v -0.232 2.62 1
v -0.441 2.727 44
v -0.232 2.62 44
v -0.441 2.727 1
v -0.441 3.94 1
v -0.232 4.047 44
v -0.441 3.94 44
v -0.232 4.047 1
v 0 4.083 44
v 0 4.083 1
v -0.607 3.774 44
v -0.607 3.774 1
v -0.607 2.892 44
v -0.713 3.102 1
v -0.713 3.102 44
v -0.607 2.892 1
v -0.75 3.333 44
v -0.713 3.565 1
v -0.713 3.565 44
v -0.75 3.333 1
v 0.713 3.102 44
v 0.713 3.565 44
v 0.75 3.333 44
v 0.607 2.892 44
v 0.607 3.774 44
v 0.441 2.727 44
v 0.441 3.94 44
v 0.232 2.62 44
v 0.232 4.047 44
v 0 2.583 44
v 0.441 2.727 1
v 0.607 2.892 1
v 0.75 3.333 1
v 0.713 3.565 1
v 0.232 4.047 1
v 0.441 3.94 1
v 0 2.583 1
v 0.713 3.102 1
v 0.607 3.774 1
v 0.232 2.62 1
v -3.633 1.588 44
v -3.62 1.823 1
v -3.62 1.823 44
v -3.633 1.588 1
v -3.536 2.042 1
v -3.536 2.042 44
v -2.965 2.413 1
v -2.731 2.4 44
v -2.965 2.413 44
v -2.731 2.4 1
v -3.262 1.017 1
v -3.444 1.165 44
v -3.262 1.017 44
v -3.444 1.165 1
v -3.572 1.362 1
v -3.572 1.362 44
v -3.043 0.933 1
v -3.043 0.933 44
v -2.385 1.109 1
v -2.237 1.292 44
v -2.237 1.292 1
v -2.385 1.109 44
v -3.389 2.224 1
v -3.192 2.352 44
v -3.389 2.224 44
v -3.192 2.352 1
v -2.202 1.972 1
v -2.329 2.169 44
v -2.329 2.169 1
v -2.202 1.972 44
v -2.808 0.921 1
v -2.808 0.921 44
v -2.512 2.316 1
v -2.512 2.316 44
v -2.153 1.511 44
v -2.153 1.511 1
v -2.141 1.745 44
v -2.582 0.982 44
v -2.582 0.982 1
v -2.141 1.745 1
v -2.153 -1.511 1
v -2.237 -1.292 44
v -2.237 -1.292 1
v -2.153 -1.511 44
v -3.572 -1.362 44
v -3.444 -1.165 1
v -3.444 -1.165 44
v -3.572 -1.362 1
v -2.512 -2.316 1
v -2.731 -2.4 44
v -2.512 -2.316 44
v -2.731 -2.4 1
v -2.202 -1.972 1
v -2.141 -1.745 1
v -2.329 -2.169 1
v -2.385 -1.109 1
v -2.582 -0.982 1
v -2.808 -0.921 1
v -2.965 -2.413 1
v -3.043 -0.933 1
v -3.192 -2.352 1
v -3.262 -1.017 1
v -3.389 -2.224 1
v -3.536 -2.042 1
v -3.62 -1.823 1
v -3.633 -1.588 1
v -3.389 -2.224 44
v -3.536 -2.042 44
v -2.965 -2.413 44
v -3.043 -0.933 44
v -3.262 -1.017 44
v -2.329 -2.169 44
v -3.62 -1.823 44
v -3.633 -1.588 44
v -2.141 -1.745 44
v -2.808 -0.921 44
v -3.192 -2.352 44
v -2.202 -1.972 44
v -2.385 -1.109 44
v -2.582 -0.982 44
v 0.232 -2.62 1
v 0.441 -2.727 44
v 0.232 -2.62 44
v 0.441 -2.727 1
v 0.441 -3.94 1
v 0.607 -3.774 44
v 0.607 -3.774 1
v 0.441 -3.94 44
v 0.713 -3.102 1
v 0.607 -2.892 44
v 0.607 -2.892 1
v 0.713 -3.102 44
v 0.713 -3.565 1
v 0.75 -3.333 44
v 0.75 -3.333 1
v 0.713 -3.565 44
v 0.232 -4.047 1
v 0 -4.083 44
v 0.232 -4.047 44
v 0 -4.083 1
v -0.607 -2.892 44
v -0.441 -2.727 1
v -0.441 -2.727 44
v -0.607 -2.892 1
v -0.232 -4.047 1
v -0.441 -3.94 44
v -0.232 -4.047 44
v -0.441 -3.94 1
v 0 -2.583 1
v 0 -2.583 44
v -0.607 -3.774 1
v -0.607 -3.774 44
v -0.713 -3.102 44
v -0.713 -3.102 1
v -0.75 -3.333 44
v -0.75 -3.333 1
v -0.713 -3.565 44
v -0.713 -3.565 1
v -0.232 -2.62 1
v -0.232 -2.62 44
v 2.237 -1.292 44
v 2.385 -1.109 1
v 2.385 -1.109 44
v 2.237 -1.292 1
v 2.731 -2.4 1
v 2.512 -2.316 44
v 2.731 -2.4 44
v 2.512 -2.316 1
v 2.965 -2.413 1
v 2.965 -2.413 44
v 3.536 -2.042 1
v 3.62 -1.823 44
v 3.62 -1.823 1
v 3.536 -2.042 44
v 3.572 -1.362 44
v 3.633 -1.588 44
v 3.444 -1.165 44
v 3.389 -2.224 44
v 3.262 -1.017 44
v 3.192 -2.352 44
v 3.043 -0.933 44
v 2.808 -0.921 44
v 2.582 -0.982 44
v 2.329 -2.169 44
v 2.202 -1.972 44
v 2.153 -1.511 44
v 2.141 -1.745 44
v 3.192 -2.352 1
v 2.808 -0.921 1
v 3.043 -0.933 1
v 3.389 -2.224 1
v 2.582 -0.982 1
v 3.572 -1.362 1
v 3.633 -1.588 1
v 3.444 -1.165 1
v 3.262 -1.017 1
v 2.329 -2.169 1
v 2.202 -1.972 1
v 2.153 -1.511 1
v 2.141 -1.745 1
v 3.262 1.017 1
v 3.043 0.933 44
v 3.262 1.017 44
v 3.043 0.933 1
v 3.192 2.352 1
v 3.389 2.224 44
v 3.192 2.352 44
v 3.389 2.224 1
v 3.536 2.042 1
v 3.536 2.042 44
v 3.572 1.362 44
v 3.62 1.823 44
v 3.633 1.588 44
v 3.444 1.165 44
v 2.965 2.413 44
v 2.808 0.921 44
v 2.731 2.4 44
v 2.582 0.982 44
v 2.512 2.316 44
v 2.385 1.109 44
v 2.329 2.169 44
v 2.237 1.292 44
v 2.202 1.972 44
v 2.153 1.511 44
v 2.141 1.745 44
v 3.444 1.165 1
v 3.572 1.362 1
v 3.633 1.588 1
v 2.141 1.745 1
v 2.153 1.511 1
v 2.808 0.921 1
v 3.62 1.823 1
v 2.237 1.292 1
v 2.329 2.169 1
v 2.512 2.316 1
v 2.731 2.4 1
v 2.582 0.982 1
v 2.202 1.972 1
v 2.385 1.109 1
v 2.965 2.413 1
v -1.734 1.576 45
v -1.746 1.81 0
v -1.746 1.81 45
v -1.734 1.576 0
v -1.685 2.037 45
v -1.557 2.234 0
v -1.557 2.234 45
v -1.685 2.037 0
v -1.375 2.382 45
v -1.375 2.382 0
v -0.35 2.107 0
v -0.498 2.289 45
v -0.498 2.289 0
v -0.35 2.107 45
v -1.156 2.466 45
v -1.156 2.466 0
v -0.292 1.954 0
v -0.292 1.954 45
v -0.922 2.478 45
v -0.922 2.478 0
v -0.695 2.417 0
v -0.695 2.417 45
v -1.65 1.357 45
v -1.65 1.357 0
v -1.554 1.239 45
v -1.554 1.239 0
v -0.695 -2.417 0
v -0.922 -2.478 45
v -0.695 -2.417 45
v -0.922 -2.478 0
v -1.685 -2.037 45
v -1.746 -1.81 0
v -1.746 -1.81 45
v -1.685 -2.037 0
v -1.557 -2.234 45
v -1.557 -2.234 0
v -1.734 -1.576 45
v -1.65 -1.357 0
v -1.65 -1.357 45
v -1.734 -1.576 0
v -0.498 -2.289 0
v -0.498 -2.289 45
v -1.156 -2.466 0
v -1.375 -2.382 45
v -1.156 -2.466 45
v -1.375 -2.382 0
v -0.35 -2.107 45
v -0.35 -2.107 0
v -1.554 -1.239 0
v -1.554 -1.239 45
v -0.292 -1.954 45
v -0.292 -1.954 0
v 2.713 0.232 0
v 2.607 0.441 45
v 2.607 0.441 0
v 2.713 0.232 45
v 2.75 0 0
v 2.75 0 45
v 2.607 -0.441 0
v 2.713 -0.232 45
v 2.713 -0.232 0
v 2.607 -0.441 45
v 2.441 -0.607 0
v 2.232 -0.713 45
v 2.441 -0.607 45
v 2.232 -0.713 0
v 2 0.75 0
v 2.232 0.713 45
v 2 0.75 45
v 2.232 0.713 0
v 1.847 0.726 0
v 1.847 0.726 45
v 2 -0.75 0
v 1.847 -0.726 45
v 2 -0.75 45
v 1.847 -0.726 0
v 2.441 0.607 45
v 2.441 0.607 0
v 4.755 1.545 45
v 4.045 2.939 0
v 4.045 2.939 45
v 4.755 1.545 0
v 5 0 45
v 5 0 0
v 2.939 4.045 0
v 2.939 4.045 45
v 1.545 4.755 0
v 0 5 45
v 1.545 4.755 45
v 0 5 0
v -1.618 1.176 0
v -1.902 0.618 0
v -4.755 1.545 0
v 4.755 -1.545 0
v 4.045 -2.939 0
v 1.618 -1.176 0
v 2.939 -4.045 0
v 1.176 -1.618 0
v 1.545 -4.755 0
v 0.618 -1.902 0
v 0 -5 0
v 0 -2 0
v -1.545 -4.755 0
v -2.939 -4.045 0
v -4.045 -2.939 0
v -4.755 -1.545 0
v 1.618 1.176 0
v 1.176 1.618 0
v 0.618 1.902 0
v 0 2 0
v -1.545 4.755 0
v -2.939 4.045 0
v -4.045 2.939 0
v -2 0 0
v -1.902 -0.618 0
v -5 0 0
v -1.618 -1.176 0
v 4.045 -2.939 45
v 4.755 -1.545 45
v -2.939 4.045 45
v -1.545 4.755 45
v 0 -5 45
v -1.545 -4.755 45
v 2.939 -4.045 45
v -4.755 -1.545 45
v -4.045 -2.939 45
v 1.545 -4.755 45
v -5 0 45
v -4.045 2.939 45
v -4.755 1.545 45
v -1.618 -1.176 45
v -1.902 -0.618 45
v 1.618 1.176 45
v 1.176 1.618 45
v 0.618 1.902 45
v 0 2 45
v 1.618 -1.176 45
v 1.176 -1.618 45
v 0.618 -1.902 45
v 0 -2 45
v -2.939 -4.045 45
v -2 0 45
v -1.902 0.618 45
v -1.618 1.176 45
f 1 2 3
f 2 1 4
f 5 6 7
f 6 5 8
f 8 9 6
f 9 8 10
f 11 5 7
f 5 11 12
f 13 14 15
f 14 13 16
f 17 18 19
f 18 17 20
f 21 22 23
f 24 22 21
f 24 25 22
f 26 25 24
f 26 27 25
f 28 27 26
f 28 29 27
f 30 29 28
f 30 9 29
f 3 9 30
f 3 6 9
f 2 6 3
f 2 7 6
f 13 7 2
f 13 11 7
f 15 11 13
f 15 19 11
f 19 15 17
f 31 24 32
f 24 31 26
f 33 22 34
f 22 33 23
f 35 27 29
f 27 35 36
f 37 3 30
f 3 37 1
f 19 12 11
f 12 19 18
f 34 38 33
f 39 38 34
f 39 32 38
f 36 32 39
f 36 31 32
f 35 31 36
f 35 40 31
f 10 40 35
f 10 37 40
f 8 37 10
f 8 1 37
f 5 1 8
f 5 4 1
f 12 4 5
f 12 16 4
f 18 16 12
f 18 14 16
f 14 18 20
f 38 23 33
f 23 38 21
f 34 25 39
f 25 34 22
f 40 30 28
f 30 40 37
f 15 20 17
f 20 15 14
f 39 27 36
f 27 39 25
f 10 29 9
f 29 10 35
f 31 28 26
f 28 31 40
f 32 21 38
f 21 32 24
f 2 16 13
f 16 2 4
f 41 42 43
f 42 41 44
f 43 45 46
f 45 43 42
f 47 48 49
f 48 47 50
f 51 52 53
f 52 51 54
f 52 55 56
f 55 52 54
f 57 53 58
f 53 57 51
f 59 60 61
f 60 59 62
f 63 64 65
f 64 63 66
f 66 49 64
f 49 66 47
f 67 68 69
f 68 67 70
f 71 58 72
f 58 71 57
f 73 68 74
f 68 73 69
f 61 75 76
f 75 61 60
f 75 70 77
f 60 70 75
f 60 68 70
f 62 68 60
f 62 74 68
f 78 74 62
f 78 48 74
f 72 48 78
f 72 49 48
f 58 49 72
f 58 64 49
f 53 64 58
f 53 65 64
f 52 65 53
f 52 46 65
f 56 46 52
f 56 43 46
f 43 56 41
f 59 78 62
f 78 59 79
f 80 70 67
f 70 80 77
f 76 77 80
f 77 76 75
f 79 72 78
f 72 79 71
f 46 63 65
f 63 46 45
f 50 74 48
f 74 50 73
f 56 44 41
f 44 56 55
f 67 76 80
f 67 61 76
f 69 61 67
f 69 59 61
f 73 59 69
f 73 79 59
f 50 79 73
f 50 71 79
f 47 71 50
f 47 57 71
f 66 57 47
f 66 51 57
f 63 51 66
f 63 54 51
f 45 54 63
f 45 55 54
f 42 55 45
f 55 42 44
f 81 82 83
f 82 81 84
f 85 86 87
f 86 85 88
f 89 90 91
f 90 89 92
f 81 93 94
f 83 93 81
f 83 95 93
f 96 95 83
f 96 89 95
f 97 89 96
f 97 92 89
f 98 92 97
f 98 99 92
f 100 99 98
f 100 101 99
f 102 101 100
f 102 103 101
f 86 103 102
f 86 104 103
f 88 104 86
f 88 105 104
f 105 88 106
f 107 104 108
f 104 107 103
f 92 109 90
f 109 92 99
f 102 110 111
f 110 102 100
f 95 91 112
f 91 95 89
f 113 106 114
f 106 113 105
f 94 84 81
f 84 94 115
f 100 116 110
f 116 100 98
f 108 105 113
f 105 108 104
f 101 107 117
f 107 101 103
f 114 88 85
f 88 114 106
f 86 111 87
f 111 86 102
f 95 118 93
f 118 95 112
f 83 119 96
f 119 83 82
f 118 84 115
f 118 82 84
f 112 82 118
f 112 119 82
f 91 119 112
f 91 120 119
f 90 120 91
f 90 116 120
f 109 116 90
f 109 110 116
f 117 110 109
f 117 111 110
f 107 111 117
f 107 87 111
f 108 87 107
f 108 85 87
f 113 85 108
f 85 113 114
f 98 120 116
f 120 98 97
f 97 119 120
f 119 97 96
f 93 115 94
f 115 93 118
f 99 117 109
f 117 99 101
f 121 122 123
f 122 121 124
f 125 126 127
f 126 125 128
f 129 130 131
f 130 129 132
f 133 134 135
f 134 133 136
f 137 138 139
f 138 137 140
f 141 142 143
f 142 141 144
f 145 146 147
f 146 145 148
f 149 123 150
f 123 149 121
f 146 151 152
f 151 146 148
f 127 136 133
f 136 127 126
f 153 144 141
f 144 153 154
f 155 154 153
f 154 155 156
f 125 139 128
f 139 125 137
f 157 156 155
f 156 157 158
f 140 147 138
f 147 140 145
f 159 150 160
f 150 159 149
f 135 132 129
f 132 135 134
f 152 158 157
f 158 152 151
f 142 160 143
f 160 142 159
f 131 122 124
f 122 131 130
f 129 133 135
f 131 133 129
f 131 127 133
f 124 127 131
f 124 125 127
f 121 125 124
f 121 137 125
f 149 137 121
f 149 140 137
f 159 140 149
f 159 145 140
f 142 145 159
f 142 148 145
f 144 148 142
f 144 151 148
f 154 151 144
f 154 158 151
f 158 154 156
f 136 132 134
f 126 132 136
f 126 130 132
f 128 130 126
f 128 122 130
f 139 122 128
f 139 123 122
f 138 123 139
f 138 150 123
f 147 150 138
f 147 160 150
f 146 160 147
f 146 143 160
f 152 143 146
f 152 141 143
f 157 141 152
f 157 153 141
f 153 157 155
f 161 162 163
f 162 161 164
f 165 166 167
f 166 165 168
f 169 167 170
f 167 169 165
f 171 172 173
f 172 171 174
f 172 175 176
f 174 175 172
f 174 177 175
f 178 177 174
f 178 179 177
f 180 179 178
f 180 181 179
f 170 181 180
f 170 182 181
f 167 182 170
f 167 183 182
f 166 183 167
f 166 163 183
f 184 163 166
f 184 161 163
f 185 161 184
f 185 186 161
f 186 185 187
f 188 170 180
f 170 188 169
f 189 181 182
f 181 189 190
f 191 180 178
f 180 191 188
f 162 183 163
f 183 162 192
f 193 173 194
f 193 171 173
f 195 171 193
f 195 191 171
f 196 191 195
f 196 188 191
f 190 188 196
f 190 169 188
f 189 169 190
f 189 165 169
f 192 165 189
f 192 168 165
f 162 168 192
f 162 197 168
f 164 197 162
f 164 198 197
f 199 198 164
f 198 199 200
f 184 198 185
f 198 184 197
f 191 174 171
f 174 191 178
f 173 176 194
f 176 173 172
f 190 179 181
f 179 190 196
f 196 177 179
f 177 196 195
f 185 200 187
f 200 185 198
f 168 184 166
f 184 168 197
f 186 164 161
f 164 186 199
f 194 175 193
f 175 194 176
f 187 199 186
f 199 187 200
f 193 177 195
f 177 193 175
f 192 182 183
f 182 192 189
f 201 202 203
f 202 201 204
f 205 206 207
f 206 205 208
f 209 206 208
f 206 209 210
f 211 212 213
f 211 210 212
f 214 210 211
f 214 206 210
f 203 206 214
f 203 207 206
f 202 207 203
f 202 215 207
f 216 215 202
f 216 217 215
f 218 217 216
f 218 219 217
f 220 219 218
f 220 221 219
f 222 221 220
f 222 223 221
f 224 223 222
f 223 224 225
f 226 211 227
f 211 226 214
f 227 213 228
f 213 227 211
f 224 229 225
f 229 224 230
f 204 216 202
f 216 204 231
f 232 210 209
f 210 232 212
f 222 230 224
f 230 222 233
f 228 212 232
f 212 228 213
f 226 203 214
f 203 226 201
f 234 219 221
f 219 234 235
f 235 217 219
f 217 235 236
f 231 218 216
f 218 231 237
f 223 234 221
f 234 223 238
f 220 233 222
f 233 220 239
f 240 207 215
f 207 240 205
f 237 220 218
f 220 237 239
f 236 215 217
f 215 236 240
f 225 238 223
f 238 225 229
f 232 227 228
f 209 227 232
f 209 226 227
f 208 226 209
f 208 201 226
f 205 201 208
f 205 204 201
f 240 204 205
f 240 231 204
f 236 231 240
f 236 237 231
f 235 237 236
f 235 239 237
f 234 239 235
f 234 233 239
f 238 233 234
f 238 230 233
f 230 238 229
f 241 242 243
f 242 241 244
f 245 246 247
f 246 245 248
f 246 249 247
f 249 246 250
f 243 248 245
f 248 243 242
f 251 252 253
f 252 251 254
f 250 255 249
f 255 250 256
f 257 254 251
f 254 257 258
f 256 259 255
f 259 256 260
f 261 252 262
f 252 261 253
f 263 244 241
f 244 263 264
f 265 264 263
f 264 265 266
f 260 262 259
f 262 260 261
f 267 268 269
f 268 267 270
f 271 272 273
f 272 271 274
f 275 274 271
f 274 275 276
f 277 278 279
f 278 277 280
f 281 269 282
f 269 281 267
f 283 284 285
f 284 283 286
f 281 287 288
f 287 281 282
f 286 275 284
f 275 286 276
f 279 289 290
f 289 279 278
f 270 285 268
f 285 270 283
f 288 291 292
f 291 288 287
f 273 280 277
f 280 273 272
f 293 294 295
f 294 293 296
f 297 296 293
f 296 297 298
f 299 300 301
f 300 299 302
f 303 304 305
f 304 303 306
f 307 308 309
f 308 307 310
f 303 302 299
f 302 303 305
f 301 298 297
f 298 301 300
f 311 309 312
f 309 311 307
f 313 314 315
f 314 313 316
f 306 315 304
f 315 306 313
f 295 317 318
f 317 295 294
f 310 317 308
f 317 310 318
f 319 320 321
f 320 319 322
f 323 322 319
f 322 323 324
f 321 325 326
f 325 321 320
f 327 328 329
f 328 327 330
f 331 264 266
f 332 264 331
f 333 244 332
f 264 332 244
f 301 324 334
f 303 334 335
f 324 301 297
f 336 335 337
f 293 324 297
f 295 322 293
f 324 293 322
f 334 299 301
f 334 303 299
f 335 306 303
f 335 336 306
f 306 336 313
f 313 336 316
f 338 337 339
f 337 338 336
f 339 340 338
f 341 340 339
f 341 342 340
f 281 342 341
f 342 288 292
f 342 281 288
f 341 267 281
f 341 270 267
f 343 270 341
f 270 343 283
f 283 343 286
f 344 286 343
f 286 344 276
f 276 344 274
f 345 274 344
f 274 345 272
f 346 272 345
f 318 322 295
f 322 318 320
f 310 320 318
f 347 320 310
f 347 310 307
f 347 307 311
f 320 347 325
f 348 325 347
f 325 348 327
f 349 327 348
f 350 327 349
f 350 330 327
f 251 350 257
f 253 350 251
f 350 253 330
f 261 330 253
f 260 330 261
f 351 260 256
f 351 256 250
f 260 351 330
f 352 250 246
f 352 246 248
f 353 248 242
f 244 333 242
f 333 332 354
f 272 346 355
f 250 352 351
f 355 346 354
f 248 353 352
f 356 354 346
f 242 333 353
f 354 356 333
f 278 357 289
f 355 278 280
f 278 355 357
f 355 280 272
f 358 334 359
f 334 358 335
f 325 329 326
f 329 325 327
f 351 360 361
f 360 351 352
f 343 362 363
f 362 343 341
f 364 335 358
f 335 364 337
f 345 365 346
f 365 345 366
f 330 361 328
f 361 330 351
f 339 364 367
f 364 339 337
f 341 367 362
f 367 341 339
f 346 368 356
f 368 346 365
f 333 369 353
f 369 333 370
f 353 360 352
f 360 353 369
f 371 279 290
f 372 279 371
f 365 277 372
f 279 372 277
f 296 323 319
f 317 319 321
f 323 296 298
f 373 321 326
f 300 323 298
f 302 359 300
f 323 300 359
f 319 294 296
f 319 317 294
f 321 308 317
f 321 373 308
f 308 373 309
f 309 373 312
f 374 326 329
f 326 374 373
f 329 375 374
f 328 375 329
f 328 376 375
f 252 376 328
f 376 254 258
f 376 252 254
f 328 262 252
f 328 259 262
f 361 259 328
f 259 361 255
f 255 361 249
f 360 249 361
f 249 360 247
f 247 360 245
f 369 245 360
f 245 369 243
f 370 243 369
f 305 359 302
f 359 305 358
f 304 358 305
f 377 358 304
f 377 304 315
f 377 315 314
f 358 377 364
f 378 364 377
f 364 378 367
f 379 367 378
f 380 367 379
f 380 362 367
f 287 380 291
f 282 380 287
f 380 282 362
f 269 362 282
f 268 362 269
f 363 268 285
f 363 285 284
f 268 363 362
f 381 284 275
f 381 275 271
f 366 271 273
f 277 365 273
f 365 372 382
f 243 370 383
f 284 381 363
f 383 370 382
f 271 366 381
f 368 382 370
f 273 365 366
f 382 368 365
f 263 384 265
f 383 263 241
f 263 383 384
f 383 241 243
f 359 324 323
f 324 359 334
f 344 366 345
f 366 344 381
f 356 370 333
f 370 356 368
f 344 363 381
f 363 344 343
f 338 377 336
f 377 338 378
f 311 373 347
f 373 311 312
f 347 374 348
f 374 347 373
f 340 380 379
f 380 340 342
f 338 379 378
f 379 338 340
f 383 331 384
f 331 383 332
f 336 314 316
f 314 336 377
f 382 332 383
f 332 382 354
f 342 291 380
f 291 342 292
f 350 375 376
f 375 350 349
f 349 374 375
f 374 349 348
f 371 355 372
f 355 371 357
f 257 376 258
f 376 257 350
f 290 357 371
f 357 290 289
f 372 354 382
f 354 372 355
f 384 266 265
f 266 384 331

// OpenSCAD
// // // PARAMETERS : // // //
module_radius = 5;
height = 45;
chamber_radius = 0.75;
cannula_radius = 0.75;
lumen_radius = 2;
dec = 5; // length of one side of the equilateral triangle
//dec_y = module_radius/6;
spacing = 3; // distance between two pairs of holes
num_chambers = 6;
num_cannula = 3; // = num_chambers // if needed
cannula_placement_radius = lumen_radius; // inner cannula = would place the cannula internaly
//cannula_placement_radius = module_radius; // = external cannula
sealing_thickness = 1; // thickness of the closure (sealing) of the cavities
$fn = 20; // determines the number of faces, and thus the resolution of the rounded surfaces!

visible = 0; // 10 = visible // 0 = integrated


///////////////////////////////////////////////////////////////////////////////////////////////////////////////////////////////////////

cannula_angle_positions = [ for (i=[1:num_cannula]) 
        each [i*360/num_cannula]
];

chamber_angle_positions = [ for (i=[1:num_chambers]) 
        each [i*360/num_chambers+180/num_chambers]
];

t_z = sealing_thickness;
t_z_l = -sealing_thickness; // initial translation of the lumen


difference(){ //#002
//color([1,0,0],alpha=0.2){
cylinder(height, module_radius, module_radius); //}
 for ($chamber_angle = chamber_angle_positions){ // # 001
    rotate([0,0,$chamber_angle])translate([(2/3) *module_radius,0, t_z+visible]) cylinder(height-2, chamber_radius, chamber_radius);}

   translate([0, 0, t_z_l ]) cylinder(height+2, lumen_radius, lumen_radius); // subtraction of the central lumen
 for ($cannula_angle = cannula_angle_positions){ // # 001
    rotate([0,0,$cannula_angle])translate([cannula_placement_radius ,0, t_z_l]) cylinder(height+2, cannula_radius, cannula_radius);
} // #001
} // #002
